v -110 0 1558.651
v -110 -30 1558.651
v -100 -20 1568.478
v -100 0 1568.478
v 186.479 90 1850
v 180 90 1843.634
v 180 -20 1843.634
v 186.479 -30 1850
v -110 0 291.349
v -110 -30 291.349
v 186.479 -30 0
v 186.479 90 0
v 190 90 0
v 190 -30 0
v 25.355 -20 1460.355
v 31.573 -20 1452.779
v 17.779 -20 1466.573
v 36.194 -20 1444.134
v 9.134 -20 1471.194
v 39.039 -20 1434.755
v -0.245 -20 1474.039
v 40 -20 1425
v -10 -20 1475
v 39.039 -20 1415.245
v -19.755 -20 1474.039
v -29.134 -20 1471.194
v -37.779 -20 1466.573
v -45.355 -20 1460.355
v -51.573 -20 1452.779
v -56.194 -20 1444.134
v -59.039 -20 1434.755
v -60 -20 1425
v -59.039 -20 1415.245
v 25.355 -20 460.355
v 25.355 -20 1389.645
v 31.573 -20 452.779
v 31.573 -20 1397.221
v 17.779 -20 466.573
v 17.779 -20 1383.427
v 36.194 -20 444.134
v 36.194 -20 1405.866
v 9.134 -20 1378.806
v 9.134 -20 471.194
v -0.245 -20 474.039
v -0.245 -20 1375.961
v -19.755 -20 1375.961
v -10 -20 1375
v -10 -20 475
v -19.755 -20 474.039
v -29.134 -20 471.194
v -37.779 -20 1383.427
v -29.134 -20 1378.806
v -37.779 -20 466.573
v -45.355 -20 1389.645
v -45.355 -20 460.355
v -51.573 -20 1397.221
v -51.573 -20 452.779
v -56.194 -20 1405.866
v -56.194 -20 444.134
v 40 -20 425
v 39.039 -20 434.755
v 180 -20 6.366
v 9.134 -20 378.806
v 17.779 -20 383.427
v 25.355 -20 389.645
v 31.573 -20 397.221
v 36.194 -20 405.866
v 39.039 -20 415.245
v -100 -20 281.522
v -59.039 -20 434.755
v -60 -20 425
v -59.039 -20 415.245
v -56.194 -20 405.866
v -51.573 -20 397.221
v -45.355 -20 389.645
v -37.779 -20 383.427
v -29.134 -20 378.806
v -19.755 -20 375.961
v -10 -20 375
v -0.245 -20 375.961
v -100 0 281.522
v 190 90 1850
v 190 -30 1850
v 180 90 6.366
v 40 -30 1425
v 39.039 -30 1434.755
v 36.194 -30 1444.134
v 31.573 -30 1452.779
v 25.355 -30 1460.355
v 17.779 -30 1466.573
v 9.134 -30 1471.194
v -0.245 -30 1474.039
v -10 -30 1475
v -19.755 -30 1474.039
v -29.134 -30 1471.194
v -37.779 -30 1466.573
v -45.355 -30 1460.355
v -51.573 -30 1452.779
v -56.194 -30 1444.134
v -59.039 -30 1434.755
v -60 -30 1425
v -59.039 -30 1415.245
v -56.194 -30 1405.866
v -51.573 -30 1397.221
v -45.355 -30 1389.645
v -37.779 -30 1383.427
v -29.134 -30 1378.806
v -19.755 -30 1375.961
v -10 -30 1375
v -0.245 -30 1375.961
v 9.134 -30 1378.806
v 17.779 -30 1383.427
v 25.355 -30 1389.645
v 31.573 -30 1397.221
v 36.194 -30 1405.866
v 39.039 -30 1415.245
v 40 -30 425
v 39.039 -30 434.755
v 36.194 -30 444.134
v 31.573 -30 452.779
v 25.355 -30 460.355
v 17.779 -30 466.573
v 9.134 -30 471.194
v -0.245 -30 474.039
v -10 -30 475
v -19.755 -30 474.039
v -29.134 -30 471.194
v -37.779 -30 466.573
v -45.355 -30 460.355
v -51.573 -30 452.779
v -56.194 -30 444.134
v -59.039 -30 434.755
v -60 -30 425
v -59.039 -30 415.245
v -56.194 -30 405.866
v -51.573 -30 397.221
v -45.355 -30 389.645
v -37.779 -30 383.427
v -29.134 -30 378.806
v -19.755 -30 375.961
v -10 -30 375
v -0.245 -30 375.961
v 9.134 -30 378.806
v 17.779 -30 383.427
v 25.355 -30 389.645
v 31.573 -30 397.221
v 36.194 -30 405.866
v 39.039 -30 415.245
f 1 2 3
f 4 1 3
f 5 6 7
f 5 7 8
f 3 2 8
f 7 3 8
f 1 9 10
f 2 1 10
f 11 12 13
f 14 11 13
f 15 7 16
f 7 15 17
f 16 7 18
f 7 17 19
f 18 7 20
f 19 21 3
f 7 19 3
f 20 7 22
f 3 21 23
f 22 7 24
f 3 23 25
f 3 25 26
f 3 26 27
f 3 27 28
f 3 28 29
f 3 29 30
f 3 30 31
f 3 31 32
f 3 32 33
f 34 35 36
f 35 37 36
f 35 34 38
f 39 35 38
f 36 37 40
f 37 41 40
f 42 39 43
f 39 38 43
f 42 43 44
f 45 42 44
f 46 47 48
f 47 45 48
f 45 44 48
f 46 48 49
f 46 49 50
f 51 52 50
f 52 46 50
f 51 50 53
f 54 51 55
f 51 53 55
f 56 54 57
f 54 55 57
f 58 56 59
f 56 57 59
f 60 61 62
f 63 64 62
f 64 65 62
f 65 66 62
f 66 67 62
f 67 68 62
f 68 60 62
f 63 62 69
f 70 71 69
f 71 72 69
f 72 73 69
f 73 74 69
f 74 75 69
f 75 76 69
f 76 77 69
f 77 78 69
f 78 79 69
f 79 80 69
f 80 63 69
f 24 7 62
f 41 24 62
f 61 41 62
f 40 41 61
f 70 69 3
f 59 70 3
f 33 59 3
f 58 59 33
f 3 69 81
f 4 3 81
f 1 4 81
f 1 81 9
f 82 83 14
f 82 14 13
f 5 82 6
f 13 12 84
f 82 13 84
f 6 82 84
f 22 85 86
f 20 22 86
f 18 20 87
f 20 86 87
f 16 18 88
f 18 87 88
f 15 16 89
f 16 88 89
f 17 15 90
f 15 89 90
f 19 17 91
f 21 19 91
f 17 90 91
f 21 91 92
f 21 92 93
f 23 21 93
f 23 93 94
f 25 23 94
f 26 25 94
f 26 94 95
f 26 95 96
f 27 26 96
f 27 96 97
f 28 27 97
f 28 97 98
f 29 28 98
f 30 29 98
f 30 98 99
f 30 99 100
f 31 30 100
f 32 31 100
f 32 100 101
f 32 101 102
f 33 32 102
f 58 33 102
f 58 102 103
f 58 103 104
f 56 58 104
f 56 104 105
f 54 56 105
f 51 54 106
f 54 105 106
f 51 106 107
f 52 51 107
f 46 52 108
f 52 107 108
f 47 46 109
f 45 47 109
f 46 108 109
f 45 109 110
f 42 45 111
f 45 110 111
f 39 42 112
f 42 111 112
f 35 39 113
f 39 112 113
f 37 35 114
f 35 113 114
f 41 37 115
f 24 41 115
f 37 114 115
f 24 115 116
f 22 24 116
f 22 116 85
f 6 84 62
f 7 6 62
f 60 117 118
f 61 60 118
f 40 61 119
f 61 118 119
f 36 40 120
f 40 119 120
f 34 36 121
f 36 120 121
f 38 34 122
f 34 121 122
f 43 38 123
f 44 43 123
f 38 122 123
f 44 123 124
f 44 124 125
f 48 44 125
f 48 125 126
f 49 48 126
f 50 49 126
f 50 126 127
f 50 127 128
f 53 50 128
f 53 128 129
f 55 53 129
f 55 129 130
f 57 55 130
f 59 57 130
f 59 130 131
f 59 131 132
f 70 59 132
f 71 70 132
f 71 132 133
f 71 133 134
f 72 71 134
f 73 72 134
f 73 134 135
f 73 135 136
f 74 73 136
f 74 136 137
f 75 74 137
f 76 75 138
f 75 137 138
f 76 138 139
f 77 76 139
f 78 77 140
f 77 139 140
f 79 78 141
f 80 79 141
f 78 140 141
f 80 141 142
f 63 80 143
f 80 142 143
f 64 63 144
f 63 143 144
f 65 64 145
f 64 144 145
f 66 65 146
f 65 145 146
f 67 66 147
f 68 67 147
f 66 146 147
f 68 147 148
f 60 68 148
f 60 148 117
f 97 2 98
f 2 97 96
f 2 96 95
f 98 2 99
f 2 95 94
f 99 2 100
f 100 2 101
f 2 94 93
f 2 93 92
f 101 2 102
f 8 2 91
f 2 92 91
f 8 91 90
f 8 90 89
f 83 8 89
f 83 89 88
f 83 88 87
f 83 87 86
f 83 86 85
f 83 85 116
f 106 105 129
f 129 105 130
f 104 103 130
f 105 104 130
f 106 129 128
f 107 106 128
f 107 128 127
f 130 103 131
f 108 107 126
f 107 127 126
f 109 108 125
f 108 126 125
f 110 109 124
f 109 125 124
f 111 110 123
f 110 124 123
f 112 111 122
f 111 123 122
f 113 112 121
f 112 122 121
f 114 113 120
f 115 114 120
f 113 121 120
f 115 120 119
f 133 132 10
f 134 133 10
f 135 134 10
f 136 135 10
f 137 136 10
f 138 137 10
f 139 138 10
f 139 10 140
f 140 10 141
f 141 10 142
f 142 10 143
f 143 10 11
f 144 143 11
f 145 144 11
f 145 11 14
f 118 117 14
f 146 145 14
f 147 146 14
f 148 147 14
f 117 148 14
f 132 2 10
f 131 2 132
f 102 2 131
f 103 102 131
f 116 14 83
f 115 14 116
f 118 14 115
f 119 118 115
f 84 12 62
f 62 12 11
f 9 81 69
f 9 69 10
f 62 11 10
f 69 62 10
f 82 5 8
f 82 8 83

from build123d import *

# Parameters (mm, degrees)
F1_DEPTH = 1850
F3_DEPTH = 200
F4_R     = 50
F5_DEPTH = 120.001


# Not quite as in the source:
# - a feature names something its author has since deleted; it is built from what else it names


with BuildPart() as f1:
    # F0 (on Top) → F1 (new body)
    with BuildSketch(Plane.XY):
        Polygon((-100, 0), (-110, 0), (-110, -30), (190, -30), (190, 90), (180, 90), (180, -20), (-100, -20), align=None)
    extrude(amount=F1_DEPTH)

    # F2 (on face) → F3 (cut)
    with BuildSketch(Plane.XZ.offset(30)):
        Polygon((186.4785214056, 0), (-110, 291.3486315578), (-110, 0), align=None)
        Polygon((-110, 1850), (-110, 1558.6513684422), (186.4785214056, 1850), align=None)
    extrude(amount=-F3_DEPTH, mode=Mode.SUBTRACT)

    # F4 (on face) → F5 (cut, through all)
    with BuildSketch(Plane.XZ.offset(30)):
        with Locations((-10, 425)):
            Circle(F4_R)
        with Locations((-10, 1425)):
            Circle(F4_R)
    extrude(amount=-F5_DEPTH, mode=Mode.SUBTRACT)


solid = f1.part
